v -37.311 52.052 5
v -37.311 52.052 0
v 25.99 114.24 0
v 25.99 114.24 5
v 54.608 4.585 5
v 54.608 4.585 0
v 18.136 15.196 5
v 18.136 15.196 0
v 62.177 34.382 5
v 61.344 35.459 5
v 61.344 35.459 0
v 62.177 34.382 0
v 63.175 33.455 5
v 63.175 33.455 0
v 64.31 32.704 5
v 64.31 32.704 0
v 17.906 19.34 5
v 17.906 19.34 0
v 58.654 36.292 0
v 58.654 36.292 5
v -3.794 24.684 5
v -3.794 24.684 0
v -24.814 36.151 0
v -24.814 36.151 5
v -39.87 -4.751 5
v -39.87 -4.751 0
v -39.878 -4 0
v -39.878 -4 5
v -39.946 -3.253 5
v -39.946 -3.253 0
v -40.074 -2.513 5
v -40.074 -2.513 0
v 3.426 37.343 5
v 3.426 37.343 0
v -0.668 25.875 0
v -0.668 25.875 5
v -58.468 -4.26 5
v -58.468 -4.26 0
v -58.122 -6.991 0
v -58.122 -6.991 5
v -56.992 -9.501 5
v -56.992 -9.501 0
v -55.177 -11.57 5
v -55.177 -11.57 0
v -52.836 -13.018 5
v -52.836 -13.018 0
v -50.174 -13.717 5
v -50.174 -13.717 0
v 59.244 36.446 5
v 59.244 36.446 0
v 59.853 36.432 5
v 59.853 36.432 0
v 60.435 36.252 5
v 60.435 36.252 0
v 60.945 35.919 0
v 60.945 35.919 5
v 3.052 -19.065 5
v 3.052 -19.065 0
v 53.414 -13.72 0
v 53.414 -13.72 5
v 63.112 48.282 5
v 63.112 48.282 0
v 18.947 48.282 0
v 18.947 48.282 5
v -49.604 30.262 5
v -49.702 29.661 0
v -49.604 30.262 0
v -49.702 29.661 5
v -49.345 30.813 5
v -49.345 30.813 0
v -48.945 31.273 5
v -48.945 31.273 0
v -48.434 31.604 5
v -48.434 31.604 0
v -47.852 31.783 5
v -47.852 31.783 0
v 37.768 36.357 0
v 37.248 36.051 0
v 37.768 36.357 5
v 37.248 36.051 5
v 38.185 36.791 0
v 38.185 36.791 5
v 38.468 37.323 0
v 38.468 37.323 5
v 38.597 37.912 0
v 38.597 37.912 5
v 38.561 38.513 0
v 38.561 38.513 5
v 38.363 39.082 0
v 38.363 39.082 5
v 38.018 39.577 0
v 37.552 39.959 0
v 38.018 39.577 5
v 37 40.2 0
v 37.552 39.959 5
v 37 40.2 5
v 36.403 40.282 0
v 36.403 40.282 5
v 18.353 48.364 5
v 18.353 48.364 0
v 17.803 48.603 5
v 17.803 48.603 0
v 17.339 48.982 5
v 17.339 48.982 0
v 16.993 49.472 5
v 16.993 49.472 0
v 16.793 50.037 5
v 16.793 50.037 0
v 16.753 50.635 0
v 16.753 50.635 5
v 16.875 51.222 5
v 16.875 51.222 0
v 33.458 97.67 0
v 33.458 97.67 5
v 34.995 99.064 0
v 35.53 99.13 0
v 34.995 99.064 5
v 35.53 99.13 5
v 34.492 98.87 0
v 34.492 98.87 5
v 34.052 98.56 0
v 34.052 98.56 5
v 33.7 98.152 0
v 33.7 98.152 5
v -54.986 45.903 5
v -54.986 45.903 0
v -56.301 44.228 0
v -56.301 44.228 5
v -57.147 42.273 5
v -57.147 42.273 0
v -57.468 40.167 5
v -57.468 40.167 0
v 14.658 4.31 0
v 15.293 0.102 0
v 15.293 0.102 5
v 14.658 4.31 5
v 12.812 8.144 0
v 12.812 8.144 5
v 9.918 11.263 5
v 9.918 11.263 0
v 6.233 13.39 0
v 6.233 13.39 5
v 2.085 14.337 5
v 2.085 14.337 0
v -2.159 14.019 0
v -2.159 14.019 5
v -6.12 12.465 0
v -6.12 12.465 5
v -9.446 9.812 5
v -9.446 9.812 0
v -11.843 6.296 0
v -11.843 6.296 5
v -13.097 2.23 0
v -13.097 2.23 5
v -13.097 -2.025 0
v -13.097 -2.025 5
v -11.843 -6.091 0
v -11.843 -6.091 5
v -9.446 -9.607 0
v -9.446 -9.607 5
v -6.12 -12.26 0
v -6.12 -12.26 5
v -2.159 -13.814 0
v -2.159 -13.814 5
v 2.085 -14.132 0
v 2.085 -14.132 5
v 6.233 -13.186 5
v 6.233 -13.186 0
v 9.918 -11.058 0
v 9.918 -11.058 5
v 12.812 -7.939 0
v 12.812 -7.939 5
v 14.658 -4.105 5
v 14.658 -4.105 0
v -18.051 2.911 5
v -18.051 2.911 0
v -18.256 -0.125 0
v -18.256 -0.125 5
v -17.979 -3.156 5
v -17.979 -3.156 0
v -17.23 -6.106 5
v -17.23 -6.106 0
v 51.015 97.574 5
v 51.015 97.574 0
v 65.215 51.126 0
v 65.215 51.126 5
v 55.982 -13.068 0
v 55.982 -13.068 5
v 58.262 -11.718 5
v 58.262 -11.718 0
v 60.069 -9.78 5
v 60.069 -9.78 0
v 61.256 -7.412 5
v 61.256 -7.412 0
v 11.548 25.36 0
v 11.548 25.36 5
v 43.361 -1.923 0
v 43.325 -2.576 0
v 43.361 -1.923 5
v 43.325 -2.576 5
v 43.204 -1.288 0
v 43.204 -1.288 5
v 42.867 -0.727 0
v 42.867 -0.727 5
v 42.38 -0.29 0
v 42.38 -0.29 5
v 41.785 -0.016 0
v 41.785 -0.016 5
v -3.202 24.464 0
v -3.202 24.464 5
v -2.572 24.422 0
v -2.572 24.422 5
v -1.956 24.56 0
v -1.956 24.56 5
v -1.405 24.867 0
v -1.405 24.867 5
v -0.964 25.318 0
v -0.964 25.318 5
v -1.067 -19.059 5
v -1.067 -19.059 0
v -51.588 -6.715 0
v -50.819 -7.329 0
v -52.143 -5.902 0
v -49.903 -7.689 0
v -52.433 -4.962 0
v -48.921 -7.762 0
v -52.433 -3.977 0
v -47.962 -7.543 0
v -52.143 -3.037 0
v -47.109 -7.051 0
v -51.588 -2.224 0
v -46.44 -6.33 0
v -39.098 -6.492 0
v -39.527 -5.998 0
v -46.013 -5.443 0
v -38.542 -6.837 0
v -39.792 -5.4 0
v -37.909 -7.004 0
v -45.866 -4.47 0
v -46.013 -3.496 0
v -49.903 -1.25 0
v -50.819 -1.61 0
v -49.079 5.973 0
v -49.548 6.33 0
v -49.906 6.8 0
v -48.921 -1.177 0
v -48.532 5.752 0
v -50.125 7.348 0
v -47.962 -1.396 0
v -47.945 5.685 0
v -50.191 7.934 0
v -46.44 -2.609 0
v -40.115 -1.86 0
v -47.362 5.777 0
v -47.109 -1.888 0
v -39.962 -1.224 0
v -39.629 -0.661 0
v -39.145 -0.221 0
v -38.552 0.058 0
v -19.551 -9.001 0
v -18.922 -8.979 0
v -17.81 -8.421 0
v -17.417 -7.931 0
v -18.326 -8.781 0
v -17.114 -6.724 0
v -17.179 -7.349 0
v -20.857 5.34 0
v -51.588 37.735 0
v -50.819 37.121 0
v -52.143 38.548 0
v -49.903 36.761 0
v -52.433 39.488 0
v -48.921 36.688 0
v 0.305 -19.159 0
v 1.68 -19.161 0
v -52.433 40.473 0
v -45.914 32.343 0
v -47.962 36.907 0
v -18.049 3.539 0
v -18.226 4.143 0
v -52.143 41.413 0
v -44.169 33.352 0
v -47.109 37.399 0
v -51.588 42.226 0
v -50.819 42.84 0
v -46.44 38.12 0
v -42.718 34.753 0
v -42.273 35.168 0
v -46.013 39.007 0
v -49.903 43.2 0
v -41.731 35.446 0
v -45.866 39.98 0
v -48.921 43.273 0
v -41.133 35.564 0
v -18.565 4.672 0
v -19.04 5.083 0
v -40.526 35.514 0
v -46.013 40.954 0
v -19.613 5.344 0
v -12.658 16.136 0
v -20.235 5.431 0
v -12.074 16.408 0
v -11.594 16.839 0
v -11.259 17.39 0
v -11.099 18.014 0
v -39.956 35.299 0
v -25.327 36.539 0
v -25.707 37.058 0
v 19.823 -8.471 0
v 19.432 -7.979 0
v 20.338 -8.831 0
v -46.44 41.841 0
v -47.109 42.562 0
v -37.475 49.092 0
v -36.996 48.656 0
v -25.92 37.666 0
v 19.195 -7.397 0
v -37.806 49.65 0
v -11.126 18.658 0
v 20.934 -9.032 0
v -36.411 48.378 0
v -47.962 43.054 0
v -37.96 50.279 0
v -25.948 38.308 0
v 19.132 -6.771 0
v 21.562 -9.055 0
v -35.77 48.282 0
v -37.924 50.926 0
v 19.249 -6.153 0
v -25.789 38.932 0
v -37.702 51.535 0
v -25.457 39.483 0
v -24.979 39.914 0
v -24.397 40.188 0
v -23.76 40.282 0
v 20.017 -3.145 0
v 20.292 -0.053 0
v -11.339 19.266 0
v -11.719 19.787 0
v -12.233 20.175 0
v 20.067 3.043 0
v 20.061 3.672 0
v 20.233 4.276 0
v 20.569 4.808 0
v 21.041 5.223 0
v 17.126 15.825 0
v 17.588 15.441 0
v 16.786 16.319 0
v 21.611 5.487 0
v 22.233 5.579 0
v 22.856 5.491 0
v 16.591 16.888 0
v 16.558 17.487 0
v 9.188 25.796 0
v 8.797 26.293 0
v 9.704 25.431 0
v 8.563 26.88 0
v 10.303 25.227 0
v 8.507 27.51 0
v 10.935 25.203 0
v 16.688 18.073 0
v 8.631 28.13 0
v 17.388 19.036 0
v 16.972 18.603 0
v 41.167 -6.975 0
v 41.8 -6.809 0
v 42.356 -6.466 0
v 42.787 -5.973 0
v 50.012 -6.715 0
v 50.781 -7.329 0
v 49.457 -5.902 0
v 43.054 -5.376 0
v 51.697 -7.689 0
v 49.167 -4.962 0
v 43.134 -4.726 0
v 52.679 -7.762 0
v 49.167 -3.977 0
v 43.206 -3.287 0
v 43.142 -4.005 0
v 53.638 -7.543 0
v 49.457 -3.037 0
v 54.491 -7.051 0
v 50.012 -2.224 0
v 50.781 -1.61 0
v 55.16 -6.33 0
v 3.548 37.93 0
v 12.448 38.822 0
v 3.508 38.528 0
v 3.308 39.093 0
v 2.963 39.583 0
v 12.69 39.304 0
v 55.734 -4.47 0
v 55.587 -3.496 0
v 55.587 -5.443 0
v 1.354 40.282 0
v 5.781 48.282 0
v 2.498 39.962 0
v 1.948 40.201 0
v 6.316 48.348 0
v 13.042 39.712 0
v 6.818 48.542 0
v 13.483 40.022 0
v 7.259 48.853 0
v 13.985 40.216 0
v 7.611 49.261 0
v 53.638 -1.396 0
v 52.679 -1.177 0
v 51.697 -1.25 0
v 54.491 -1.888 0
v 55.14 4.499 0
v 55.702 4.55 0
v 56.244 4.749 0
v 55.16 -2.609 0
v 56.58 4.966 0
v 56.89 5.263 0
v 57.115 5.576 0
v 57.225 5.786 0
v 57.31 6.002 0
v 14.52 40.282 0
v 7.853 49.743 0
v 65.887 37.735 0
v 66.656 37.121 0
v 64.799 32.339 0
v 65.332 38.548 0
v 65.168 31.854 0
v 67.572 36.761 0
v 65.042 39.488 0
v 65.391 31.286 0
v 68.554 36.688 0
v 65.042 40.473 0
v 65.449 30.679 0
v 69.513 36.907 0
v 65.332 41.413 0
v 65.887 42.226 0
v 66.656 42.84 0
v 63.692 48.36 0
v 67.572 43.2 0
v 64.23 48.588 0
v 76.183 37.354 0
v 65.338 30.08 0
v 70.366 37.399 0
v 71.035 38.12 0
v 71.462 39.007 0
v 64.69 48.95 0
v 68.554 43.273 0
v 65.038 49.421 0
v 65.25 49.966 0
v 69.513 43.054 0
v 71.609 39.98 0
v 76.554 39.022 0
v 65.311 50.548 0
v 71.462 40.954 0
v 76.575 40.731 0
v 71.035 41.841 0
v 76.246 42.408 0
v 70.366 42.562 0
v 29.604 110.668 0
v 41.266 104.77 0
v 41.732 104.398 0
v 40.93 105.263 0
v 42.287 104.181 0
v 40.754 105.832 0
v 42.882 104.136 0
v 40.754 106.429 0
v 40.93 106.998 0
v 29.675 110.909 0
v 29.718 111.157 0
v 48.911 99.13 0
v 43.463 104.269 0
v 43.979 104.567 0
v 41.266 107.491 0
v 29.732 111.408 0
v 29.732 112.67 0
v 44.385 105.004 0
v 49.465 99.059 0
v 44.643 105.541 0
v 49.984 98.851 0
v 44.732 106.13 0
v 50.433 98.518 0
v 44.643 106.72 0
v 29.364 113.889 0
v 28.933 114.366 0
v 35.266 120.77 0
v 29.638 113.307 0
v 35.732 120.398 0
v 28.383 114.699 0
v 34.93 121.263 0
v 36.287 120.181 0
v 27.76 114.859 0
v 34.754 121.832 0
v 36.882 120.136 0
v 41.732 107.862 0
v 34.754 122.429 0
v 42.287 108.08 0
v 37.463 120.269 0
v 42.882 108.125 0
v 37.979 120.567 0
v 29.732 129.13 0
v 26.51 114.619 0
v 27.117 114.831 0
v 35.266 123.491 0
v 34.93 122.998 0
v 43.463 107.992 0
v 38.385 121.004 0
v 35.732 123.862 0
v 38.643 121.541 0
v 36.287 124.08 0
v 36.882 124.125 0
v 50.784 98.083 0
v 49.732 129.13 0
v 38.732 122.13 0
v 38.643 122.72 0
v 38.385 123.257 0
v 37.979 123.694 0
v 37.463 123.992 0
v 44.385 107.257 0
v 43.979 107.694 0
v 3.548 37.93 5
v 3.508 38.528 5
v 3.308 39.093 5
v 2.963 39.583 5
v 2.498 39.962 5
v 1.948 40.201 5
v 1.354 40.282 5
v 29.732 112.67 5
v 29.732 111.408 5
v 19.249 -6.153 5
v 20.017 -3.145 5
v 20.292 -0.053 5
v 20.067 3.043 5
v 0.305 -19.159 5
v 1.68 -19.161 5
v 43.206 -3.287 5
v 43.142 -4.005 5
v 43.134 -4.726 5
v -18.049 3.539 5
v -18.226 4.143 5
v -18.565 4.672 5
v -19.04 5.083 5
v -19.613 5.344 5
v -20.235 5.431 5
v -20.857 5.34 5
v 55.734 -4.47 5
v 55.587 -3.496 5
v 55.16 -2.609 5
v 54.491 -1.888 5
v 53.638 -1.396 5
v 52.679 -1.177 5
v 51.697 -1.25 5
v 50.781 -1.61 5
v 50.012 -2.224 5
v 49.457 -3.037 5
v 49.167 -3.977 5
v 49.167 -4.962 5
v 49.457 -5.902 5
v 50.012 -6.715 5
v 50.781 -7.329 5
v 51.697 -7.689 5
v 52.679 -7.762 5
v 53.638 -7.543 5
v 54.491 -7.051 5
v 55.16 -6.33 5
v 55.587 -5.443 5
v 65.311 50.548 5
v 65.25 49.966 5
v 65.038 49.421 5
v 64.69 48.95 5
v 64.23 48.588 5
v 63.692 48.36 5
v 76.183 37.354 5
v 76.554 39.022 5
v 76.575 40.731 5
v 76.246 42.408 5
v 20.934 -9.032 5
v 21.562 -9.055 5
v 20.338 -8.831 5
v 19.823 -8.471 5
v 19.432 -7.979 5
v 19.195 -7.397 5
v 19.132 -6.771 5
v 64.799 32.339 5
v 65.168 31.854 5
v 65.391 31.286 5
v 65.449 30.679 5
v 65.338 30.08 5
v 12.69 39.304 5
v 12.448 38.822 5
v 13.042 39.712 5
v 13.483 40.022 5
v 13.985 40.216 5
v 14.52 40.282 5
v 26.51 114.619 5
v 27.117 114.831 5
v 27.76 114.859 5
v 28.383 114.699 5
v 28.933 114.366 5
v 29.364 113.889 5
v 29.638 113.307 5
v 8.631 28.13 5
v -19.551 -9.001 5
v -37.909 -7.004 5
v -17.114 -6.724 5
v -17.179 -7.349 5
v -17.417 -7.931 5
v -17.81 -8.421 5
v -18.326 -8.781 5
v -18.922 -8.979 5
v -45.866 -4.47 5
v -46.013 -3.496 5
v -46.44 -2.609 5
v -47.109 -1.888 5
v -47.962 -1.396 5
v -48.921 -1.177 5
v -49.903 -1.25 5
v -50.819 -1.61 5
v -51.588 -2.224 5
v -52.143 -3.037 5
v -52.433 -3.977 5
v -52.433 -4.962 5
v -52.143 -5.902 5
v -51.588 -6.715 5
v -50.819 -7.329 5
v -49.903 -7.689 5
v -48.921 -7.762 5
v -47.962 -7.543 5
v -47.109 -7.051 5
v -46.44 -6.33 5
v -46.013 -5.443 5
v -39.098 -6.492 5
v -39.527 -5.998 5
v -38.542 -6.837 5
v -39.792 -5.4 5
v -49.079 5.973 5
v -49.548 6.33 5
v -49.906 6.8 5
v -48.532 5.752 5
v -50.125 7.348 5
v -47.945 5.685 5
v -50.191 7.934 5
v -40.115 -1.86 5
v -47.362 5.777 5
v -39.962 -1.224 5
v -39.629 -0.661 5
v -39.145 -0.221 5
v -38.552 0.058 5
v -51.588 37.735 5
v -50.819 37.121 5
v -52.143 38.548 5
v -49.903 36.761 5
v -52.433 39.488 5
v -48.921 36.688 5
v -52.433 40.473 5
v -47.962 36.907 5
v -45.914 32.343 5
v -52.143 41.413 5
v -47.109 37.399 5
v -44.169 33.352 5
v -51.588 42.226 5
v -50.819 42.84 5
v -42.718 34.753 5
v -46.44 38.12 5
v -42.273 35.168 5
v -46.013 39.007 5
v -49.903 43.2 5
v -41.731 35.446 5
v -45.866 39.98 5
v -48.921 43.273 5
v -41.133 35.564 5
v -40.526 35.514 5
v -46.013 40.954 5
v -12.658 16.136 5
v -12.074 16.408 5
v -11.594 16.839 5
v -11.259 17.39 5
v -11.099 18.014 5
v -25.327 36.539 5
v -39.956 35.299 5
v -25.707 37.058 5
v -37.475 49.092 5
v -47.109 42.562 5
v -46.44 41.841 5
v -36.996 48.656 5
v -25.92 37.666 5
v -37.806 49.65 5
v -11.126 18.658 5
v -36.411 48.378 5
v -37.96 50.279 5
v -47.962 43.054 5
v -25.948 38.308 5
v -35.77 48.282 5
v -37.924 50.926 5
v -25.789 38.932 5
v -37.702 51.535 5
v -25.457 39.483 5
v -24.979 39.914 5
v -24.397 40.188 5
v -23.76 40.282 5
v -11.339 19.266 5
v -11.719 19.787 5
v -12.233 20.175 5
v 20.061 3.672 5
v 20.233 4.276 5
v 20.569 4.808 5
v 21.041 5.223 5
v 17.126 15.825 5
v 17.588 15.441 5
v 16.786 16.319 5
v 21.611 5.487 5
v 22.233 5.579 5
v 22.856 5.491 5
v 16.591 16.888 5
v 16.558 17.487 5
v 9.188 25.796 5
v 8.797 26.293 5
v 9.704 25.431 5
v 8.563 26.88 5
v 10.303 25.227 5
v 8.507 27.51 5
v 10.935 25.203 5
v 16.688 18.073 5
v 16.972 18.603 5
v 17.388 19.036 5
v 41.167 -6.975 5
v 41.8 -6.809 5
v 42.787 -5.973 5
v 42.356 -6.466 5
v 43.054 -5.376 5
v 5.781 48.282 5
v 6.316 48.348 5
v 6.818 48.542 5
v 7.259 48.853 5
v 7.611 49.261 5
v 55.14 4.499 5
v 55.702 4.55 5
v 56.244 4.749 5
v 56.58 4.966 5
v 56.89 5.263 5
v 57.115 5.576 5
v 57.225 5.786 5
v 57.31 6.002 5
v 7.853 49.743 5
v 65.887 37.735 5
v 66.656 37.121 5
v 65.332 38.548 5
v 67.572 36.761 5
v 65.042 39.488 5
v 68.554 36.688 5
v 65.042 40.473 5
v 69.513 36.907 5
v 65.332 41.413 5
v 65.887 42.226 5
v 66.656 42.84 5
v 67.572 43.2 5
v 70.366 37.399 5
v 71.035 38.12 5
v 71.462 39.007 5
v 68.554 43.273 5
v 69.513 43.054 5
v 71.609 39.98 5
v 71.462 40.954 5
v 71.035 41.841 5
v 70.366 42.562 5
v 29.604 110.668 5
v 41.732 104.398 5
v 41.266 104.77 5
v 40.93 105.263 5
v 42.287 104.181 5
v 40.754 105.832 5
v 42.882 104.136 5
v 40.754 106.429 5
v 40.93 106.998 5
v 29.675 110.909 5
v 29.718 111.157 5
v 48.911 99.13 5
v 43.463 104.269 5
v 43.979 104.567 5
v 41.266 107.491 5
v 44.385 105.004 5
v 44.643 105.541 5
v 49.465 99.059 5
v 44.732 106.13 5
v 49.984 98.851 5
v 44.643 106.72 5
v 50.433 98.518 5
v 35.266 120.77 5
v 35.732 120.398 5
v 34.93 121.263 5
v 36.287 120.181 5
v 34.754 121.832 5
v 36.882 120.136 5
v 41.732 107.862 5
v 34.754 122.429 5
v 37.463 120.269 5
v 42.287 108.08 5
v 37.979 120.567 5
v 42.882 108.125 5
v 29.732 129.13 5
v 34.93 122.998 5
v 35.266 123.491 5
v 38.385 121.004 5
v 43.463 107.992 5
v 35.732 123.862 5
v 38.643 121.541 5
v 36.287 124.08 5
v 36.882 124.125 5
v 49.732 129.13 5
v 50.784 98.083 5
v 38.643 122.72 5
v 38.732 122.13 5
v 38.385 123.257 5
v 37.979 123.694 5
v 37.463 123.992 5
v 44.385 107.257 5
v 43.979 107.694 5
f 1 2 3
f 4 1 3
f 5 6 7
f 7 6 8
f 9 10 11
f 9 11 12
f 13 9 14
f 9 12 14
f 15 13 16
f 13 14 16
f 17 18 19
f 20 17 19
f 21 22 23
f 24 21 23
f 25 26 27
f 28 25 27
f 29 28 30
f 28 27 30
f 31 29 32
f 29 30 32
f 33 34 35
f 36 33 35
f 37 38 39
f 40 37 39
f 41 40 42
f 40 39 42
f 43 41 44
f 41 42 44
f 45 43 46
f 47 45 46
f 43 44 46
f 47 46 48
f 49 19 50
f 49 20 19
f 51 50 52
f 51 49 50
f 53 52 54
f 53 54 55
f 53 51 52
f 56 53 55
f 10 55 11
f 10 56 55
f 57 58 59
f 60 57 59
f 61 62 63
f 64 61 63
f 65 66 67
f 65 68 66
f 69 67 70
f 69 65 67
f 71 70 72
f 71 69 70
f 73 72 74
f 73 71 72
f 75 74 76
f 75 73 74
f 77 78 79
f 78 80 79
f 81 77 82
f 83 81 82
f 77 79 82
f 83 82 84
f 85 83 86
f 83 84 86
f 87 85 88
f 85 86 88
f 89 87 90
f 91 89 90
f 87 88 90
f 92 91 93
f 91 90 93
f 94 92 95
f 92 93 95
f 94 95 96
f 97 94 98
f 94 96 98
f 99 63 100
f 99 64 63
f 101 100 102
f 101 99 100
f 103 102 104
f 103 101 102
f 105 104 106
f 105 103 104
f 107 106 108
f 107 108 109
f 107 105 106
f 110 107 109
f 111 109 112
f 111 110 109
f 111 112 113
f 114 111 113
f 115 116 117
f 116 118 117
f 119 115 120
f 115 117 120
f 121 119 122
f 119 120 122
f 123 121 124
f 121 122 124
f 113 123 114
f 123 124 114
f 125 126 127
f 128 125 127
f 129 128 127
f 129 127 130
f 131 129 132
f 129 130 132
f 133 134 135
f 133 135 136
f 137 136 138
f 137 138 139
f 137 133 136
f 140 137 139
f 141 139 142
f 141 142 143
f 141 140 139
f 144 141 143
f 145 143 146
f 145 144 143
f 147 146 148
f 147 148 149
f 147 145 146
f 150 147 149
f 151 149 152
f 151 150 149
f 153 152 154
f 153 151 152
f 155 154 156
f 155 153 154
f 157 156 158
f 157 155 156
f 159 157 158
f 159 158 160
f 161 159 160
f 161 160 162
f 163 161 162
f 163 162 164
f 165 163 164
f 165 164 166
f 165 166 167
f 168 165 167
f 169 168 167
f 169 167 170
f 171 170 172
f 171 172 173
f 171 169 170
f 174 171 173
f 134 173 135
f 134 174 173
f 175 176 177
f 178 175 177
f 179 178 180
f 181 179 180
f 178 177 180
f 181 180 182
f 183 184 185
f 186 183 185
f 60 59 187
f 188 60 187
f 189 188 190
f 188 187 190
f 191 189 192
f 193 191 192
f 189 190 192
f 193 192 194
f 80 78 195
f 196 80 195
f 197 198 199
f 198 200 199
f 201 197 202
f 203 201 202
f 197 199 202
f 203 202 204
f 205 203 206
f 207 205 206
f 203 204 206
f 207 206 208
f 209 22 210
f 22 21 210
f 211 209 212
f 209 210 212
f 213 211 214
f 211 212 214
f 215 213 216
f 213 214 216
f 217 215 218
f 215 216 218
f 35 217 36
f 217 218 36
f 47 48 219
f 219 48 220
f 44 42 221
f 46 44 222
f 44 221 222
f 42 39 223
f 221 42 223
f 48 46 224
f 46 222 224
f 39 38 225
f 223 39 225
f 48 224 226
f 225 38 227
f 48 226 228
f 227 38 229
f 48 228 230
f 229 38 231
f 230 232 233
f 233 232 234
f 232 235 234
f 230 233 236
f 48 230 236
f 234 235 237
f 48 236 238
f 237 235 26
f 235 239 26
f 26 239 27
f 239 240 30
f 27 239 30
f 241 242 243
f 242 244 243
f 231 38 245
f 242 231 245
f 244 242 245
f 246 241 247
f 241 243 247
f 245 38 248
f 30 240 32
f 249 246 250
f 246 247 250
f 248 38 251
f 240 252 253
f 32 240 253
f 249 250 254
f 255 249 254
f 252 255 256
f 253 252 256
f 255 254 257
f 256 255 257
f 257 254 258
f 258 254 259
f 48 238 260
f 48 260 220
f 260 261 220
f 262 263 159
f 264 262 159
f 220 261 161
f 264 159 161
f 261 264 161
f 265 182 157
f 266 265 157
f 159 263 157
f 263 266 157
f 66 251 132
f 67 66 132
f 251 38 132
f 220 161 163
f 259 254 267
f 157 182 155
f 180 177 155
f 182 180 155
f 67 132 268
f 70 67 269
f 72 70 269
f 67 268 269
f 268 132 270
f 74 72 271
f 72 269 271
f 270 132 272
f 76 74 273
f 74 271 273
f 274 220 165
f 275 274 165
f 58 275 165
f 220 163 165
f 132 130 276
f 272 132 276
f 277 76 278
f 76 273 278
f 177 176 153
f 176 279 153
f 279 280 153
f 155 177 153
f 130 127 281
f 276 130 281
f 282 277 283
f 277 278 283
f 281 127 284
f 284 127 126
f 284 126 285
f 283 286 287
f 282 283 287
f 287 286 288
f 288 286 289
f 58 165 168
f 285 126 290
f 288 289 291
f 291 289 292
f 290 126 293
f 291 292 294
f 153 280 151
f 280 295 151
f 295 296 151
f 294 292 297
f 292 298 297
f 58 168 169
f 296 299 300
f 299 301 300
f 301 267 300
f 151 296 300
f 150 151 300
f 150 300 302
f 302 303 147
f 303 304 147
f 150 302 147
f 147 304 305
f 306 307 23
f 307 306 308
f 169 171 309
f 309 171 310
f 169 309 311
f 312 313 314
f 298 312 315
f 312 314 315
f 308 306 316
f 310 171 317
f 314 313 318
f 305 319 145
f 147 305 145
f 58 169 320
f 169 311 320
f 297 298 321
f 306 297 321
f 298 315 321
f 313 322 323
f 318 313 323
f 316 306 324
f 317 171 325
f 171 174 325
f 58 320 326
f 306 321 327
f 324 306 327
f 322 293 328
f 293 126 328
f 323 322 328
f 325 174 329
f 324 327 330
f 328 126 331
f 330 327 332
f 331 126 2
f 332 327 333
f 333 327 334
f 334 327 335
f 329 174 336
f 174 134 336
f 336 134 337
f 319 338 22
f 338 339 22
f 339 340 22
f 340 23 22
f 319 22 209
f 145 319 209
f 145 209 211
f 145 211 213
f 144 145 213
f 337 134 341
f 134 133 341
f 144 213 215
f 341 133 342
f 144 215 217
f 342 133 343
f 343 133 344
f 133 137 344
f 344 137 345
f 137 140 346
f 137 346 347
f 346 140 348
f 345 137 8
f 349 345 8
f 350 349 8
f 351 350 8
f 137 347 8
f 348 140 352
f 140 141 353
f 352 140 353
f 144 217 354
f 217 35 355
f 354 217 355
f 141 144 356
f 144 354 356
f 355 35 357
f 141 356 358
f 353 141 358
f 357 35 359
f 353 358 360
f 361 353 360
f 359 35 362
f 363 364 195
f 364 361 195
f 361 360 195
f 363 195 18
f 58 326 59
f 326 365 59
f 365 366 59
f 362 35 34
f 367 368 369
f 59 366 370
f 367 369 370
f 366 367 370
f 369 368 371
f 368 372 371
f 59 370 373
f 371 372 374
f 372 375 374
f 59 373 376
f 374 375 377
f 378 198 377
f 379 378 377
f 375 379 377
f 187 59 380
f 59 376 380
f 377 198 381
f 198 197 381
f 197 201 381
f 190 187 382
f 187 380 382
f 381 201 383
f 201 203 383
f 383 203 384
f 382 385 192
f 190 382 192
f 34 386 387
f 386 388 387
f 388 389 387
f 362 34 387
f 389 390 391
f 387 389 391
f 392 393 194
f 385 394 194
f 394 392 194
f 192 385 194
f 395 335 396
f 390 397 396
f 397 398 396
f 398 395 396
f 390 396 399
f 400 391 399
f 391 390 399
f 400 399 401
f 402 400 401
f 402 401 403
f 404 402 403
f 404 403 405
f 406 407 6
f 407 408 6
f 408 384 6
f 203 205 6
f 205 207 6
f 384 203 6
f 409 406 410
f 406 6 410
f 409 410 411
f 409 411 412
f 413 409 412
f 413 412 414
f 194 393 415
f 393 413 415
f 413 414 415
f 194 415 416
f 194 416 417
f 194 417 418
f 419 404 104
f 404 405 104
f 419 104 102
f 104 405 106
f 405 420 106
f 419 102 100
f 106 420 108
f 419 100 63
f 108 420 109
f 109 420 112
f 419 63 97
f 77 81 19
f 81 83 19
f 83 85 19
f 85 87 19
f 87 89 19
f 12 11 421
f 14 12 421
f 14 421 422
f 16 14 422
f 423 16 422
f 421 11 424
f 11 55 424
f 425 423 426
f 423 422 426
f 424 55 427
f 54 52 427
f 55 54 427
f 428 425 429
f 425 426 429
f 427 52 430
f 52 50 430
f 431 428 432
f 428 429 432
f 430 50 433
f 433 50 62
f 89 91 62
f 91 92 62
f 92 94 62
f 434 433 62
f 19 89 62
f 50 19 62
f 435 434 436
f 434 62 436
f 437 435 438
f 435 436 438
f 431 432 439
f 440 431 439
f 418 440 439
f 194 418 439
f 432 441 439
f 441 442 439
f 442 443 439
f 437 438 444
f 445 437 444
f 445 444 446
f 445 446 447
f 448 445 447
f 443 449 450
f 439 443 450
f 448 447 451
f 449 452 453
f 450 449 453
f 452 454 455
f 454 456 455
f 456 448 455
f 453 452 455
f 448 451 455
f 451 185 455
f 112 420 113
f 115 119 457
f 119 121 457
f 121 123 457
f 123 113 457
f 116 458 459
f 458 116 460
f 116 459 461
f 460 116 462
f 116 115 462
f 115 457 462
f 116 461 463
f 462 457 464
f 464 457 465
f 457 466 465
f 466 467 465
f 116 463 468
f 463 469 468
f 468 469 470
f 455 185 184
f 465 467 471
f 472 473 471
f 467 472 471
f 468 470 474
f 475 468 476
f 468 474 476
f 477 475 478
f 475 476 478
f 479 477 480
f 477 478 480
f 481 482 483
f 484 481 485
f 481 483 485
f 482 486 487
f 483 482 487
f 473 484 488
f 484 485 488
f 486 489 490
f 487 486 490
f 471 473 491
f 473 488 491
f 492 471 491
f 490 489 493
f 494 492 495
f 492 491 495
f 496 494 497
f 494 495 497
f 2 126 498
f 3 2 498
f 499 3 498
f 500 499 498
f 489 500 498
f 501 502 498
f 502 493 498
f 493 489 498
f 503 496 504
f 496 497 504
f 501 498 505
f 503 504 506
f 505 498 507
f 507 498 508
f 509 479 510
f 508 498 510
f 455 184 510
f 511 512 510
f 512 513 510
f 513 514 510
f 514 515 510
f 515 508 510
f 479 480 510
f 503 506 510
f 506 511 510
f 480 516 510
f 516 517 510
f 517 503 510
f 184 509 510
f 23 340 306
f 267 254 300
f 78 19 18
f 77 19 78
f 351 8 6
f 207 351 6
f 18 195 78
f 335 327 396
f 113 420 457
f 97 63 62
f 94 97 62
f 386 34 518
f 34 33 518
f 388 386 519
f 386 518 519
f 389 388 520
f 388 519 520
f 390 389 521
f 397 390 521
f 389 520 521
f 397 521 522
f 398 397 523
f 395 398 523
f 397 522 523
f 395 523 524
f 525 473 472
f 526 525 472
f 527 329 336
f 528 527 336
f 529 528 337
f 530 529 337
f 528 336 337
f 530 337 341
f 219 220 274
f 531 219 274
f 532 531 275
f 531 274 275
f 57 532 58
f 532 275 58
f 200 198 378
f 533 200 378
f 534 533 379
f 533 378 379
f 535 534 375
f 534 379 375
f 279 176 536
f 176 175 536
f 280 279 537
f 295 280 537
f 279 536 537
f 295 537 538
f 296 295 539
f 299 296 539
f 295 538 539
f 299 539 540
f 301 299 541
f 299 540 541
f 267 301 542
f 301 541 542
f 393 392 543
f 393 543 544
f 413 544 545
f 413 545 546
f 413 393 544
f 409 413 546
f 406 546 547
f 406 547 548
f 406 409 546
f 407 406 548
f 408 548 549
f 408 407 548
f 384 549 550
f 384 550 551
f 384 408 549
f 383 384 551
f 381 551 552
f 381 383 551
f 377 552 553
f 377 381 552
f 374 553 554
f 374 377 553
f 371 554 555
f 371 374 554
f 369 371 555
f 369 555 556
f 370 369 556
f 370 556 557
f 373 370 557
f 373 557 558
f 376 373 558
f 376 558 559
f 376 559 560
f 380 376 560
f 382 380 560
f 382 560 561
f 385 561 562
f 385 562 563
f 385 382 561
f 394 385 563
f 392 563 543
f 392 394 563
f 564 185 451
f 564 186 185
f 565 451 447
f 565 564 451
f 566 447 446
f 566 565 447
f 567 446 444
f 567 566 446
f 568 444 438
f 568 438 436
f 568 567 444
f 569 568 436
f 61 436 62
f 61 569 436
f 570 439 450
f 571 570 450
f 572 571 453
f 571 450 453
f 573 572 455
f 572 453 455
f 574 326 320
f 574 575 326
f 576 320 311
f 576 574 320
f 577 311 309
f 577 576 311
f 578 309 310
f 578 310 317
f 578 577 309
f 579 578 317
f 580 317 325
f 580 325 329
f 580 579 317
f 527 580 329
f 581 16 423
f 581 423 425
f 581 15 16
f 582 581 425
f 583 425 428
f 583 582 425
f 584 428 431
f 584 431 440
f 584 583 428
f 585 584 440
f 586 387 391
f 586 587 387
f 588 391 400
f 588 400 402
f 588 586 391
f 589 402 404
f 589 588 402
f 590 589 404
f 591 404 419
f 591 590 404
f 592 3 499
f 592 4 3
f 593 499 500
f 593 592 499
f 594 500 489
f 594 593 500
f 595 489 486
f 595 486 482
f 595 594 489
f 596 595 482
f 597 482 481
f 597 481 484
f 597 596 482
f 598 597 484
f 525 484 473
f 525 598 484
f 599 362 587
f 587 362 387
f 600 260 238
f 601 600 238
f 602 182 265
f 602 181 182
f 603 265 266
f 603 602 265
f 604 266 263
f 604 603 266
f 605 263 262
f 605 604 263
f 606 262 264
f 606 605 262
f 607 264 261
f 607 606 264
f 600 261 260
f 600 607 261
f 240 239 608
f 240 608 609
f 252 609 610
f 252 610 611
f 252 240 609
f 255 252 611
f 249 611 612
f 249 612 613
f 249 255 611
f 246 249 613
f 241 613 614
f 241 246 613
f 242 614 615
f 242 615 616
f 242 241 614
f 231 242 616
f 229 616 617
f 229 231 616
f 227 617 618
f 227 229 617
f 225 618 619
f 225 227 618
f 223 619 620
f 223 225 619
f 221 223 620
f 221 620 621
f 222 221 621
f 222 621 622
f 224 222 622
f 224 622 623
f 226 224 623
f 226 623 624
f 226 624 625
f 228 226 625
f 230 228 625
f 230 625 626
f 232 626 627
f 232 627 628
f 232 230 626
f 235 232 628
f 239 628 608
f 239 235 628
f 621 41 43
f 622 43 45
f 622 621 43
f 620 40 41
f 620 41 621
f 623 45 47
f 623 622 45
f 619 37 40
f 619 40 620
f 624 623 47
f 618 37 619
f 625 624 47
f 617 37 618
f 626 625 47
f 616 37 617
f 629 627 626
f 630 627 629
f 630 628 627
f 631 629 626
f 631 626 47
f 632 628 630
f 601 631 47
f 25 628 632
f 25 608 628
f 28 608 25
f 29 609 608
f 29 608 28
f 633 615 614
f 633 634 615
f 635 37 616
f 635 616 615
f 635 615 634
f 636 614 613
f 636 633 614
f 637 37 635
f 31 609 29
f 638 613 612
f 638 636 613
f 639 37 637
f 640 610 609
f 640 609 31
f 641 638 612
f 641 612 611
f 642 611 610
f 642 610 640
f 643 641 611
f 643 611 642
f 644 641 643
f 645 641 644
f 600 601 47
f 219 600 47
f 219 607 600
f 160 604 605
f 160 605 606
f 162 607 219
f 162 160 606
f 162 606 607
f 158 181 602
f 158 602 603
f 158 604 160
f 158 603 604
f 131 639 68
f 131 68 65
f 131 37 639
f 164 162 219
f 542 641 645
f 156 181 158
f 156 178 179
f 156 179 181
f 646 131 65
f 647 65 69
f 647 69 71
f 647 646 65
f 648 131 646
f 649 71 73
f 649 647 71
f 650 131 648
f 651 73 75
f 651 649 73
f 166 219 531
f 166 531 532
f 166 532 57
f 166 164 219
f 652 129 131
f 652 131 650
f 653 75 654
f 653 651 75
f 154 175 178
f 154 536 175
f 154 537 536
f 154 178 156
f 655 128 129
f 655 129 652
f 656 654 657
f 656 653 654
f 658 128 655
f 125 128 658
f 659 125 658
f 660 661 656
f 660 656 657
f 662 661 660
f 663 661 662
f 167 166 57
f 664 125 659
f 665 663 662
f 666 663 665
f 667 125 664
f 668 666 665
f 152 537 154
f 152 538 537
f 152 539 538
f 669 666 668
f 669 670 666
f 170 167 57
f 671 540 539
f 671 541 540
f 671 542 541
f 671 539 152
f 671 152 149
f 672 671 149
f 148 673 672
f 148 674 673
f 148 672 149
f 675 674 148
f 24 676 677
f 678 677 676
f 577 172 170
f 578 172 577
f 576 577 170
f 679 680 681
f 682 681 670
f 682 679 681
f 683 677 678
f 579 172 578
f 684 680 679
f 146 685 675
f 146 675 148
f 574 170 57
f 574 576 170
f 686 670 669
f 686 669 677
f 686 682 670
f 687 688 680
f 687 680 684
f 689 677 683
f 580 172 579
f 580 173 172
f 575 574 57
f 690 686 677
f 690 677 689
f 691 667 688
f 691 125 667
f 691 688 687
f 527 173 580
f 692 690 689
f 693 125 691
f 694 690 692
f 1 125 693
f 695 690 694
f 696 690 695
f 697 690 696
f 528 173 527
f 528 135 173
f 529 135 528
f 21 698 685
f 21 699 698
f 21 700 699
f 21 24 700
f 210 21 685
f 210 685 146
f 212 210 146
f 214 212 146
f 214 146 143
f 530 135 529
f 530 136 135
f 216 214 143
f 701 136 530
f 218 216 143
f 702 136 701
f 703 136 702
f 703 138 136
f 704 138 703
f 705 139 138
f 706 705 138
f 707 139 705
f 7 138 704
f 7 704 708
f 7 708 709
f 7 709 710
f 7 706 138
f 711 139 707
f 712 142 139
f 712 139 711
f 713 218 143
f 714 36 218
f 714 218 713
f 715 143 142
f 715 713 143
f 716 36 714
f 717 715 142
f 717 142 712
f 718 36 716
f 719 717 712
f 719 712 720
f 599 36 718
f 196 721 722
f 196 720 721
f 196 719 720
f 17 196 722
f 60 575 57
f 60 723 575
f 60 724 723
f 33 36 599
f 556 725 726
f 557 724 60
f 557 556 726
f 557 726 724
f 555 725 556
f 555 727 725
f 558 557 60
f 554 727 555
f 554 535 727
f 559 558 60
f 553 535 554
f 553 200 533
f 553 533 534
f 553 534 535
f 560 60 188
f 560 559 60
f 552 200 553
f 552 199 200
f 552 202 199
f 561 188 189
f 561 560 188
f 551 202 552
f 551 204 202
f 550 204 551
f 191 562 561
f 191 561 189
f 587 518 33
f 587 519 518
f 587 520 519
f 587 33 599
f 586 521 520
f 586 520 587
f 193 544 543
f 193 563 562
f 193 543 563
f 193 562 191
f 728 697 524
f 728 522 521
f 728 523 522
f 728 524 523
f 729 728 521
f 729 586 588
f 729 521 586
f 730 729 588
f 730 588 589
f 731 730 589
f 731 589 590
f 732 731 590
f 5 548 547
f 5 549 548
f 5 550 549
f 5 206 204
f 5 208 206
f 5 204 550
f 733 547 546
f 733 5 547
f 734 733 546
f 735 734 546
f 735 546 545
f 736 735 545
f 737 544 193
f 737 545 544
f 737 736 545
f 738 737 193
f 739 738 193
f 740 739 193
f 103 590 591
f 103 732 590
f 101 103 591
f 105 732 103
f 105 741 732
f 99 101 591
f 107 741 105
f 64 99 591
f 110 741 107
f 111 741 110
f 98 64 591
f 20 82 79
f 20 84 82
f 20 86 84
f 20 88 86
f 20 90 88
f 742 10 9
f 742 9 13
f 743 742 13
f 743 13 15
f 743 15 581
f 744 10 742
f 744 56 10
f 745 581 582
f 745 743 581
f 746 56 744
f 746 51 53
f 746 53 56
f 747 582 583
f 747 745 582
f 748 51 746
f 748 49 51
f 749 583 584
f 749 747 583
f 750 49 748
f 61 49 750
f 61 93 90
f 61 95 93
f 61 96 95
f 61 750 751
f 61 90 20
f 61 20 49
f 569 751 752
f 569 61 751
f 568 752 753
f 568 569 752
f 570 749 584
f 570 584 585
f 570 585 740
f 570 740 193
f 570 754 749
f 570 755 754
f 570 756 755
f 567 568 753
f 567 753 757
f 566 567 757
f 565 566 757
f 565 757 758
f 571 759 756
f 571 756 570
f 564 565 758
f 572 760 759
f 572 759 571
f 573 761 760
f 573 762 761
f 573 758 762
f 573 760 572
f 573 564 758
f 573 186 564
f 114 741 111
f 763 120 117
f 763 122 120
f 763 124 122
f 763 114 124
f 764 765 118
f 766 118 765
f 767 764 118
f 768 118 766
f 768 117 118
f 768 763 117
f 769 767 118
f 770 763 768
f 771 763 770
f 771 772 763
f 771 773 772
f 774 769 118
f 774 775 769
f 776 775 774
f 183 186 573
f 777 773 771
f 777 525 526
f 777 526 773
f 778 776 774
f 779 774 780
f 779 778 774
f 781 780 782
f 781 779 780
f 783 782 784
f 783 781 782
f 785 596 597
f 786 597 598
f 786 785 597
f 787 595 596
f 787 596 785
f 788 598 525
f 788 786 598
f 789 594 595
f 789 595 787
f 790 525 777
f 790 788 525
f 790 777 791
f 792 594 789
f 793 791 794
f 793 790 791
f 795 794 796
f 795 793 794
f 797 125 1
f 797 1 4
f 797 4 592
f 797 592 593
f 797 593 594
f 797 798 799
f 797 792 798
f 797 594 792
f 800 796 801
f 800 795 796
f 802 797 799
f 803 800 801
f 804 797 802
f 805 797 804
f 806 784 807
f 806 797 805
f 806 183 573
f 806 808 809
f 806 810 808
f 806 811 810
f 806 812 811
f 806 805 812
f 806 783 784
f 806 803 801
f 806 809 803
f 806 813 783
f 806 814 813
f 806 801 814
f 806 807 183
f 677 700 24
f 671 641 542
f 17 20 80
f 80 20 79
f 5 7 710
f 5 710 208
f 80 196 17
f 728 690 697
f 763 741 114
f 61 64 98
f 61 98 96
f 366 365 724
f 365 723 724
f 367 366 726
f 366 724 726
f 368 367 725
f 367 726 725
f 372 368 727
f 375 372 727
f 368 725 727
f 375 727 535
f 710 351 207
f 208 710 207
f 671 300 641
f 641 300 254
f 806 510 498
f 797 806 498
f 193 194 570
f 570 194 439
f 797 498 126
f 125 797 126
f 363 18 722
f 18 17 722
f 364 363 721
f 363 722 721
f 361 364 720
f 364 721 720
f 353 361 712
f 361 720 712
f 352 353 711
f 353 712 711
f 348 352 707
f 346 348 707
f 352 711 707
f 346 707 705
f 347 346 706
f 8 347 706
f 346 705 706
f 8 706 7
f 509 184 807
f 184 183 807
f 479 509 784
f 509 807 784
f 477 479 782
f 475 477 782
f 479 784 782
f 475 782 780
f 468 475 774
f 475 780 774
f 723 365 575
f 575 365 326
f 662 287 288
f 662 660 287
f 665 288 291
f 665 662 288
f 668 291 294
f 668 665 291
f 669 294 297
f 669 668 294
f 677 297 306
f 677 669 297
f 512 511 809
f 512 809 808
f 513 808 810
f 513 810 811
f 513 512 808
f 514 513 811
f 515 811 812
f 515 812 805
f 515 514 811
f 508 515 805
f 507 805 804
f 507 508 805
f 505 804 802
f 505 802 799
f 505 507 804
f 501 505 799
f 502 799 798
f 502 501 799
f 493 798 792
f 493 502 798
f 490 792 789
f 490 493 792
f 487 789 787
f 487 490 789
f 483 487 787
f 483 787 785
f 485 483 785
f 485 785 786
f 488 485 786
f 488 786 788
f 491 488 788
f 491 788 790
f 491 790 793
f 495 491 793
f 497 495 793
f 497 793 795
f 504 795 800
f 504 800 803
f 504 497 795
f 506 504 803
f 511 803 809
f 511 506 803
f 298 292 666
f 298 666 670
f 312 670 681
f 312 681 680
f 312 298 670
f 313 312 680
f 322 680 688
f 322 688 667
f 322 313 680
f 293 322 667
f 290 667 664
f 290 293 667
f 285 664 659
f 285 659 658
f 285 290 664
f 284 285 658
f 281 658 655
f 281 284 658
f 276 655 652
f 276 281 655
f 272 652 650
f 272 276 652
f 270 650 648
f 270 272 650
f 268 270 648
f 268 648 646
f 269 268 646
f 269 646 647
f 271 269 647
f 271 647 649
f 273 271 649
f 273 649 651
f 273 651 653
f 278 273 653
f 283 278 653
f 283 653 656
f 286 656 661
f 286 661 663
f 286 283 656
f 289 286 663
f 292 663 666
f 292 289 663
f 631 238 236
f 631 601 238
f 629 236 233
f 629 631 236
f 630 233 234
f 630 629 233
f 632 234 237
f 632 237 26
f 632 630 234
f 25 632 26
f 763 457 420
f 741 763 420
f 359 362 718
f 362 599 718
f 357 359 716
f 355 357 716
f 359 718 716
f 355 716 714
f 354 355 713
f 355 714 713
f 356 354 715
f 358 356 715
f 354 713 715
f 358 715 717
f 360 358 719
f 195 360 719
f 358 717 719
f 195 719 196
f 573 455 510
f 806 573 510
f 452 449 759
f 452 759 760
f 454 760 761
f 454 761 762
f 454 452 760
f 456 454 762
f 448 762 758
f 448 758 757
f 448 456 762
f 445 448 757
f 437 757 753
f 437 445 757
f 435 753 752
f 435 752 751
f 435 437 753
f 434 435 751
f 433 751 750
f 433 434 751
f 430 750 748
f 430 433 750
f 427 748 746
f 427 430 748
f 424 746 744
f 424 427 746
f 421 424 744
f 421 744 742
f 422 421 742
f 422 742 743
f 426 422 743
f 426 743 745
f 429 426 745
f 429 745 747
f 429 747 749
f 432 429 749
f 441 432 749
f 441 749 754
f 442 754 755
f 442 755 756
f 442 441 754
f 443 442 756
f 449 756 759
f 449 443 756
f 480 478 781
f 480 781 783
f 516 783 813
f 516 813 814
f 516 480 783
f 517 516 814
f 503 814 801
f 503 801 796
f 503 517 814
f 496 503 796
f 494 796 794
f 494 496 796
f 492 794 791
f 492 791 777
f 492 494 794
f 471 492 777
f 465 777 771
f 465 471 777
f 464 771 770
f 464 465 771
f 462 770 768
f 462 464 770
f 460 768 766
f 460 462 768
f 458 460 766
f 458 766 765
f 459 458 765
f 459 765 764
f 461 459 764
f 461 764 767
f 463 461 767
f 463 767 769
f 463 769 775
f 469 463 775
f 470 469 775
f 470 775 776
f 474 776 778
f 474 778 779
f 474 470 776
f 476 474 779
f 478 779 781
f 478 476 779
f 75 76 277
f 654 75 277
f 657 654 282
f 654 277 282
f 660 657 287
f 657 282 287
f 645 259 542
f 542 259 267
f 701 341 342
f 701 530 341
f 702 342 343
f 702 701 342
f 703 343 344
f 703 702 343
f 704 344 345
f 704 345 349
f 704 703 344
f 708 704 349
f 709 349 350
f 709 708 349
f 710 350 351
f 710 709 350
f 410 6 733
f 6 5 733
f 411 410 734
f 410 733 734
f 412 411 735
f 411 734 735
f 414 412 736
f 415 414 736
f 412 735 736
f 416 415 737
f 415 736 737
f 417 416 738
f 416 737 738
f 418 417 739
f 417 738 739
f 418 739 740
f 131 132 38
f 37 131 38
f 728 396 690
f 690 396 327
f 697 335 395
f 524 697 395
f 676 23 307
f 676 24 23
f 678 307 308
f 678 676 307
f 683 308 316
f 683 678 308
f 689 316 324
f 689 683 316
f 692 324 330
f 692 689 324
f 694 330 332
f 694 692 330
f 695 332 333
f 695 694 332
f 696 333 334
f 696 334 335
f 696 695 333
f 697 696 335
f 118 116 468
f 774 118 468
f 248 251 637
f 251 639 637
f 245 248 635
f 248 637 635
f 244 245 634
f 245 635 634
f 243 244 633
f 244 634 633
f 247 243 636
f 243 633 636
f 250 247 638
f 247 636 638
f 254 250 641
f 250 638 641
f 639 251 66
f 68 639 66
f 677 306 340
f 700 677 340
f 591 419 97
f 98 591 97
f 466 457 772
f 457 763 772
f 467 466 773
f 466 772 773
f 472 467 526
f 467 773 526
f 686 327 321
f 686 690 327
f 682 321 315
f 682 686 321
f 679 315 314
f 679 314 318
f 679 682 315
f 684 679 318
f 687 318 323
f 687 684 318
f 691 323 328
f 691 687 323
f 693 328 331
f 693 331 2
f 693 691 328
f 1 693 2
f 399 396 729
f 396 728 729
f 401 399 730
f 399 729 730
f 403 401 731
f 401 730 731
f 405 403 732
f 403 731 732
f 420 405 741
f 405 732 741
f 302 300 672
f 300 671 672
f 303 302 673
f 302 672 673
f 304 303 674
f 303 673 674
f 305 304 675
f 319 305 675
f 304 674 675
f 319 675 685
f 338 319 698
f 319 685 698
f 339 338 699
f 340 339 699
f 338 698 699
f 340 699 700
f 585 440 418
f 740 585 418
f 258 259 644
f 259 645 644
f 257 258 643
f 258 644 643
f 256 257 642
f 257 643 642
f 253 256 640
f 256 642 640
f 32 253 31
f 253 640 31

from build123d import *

# Parameters (mm, degrees)
SKETCH1_R           = 3.302
SKETCH1_R_2         = 14.2748
SKETCH1_R_3         = 2
BOSS_EXTRUDE1_DEPTH = 5
FILLET1_R           = 2.2


with BuildPart() as part:
    # Sketch1 → Boss-Extrude1 (new body)
    with BuildSketch(Plane.XY):
        with BuildLine():
            Line((49.732074359, 129.130431425), (29.732074359, 129.130431425))
            Line((29.732074359, 129.130431425), (-54.986003567, 45.902692248))
            ThreePointArc((-54.986003567, 45.902692248), (-56.787195673, 43.277388838), (-57.467824457, 40.167203079))
            Line((-57.467824457, 40.167203079), (-58.467571363, -4.260299734))
            ThreePointArc((-58.467571363, -4.260299734), (-56.161422432, -10.602936869), (-50.173941362, -13.717008024))
            Line((-50.173941362, -13.717008024), (-1.066715703, -19.05931292))
            ThreePointArc((-1.066715703, -19.05931292), (0.992574977, -19.172351986), (3.052155178, -19.06471679))
            Line((3.052155178, -19.06471679), (53.413821776, -13.719615927))
            ThreePointArc((53.413821776, -13.719615927), (58.261915472, -11.718027487), (61.25647558, -7.411871598))
            Line((61.25647558, -7.411871598), (76.182819246, 37.354437047))
            ThreePointArc((76.182819246, 37.354437047), (76.608419263, 39.876139592), (76.246305111, 42.407738382))
            Line((76.246305111, 42.407738382), (49.732074359, 129.130431425))
        make_face()
        with Locations((-49.167925641, -4.469568575)):
            Circle(SKETCH1_R, mode=Mode.SUBTRACT)
        with BuildLine():
            Line((-15.743011398, -9.415499117), (-40.152332132, -6.760044))
            ThreePointArc((-40.152332132, -6.760044), (-39.904287902, -3.625637398), (-40.714646148, -0.587652835))
            Line((-40.714646148, -0.587652835), (-17.187009107, 6.434930438))
            ThreePointArc((-17.187009107, 6.434930438), (-18.177445963, -1.64628978), (-15.743011398, -9.415499117))
        make_face(mode=Mode.SUBTRACT)
        with Locations((1.017863078, 0.102431425)):
            Circle(SKETCH1_R_2, mode=Mode.SUBTRACT)
        with BuildLine():
            ThreePointArc((-49.656497245, 31.692820081), (-45.010872906, 32.79418647), (-41.740102305, 36.27224528))
            Line((-41.740102305, 36.27224528), (-7.597542604, 17.645980927))
            Line((-7.597542604, 17.645980927), (-50.259137287, 4.912249924))
            Line((-50.259137287, 4.912249924), (-49.656497245, 31.692820081))
        make_face(mode=Mode.SUBTRACT)
        with Locations((-49.167925641, 39.980431425)):
            Circle(SKETCH1_R, mode=Mode.SUBTRACT)
        Polygon((-32.386395914, 40.282431425), (4.475234555, 40.282431425), (-1.533823666, 23.450999579), align=None, mode=Mode.SUBTRACT)
        with BuildLine():
            ThreePointArc((60.530999596, 37.07253437), (62.657762713, 33.896971725), (65.981819268, 32.010714193))
            Line((65.981819268, 32.010714193), (56.592331805, 3.850254859))
            ThreePointArc((56.592331805, 3.850254859), (55.825298544, 4.191449473), (55.030627874, 4.462101125))
            Line((55.030627874, 4.462101125), (12.139397937, 16.940748464))
            Line((12.139397937, 16.940748464), (60.530999596, 37.07253437))
        make_face(mode=Mode.SUBTRACT)
        with BuildLine():
            ThreePointArc((17.753705258, -9.459446089), (20.216903145, -1.60483995), (19.178334944, 6.561160143))
            Line((19.178334944, 6.561160143), (43.95204944, -0.646430941))
            ThreePointArc((43.95204944, -0.646430941), (43.16663603, -3.645641046), (43.410501788, -6.736379627))
            Line((43.410501788, -6.736379627), (17.753705258, -9.459446089))
        make_face(mode=Mode.SUBTRACT)
        with Locations((52.432074359, -4.469568575)):
            Circle(SKETCH1_R, mode=Mode.SUBTRACT)
        Polygon((12.969784548, 40.282431425), (47.419131213, 40.282431425), (6.960726327, 23.450999579), align=None, mode=Mode.SUBTRACT)
        with Locations((68.307074359, 39.980431425)):
            Circle(SKETCH1_R, mode=Mode.SUBTRACT)
        Polygon((-41.148197142, 48.282431425), (29.732074359, 117.915795328), (29.732074359, 111.027090937), (7.331347226, 48.282431425), align=None, mode=Mode.SUBTRACT)
        Polygon((66.084655222, 48.282431425), (15.825897219, 48.282431425), (33.979349356, 99.130431425), (50.538601957, 99.130431425), align=None, mode=Mode.SUBTRACT)
        with Locations((36.732074359, 122.130431425)):
            Circle(SKETCH1_R_3, mode=Mode.SUBTRACT)
        with Locations((42.732074359, 106.130431425)):
            Circle(SKETCH1_R_3, mode=Mode.SUBTRACT)
    extrude(amount=BOSS_EXTRUDE1_DEPTH)

    # Fillet1
    fillet1_edges = [part.edges().sort_by_distance(p)[0] for p in [
        (43.95204944, -0.646430941, 2.5),
        (43.410501788, -6.736379627, 2.5),
        (-40.152332132, -6.760044, 2.5),
        (-40.714646148, -0.587652835, 2.5),
        (-41.148197142, 48.282431425, 2.5),
        (7.331347226, 48.282431425, 2.5),
        (66.084655222, 48.282431425, 2.5),
        (6.960726327, 23.450999579, 2.5),
        (47.419131213, 40.282431425, 2.5),
        (-49.656497245, 31.692820081, 2.5),
        (-41.740102305, 36.27224528, 2.5),
        (-50.259137287, 4.912249924, 2.5),
        (-32.386395914, 40.282431425, 2.5),
        (4.475234555, 40.282431425, 2.5),
        (12.969784548, 40.282431425, 2.5),
        (12.139397937, 16.940748464, 2.5),
        (60.530999596, 37.07253437, 2.5),
        (65.981819268, 32.010714193, 2.5),
        (56.592331805, 3.850254859, 2.5),
        (17.753705258, -9.459446089, 2.5),
        (19.178334944, 6.561160143, 2.5),
        (-15.743011398, -9.415499117, 2.5),
        (-17.187009107, 6.434930438, 2.5),
        (-7.597542604, 17.645980927, 2.5),
        (-1.533823666, 23.450999579, 2.5),
        (33.979349356, 99.130431425, 2.5),
        (15.825897219, 48.282431425, 2.5),
        (50.538601957, 99.130431425, 2.5),
        (29.732074359, 117.915795328, 2.5),
        (29.732074359, 111.027090937, 2.5),
    ]]
    fillet(fillet1_edges, radius=FILLET1_R)


solid = part.part
